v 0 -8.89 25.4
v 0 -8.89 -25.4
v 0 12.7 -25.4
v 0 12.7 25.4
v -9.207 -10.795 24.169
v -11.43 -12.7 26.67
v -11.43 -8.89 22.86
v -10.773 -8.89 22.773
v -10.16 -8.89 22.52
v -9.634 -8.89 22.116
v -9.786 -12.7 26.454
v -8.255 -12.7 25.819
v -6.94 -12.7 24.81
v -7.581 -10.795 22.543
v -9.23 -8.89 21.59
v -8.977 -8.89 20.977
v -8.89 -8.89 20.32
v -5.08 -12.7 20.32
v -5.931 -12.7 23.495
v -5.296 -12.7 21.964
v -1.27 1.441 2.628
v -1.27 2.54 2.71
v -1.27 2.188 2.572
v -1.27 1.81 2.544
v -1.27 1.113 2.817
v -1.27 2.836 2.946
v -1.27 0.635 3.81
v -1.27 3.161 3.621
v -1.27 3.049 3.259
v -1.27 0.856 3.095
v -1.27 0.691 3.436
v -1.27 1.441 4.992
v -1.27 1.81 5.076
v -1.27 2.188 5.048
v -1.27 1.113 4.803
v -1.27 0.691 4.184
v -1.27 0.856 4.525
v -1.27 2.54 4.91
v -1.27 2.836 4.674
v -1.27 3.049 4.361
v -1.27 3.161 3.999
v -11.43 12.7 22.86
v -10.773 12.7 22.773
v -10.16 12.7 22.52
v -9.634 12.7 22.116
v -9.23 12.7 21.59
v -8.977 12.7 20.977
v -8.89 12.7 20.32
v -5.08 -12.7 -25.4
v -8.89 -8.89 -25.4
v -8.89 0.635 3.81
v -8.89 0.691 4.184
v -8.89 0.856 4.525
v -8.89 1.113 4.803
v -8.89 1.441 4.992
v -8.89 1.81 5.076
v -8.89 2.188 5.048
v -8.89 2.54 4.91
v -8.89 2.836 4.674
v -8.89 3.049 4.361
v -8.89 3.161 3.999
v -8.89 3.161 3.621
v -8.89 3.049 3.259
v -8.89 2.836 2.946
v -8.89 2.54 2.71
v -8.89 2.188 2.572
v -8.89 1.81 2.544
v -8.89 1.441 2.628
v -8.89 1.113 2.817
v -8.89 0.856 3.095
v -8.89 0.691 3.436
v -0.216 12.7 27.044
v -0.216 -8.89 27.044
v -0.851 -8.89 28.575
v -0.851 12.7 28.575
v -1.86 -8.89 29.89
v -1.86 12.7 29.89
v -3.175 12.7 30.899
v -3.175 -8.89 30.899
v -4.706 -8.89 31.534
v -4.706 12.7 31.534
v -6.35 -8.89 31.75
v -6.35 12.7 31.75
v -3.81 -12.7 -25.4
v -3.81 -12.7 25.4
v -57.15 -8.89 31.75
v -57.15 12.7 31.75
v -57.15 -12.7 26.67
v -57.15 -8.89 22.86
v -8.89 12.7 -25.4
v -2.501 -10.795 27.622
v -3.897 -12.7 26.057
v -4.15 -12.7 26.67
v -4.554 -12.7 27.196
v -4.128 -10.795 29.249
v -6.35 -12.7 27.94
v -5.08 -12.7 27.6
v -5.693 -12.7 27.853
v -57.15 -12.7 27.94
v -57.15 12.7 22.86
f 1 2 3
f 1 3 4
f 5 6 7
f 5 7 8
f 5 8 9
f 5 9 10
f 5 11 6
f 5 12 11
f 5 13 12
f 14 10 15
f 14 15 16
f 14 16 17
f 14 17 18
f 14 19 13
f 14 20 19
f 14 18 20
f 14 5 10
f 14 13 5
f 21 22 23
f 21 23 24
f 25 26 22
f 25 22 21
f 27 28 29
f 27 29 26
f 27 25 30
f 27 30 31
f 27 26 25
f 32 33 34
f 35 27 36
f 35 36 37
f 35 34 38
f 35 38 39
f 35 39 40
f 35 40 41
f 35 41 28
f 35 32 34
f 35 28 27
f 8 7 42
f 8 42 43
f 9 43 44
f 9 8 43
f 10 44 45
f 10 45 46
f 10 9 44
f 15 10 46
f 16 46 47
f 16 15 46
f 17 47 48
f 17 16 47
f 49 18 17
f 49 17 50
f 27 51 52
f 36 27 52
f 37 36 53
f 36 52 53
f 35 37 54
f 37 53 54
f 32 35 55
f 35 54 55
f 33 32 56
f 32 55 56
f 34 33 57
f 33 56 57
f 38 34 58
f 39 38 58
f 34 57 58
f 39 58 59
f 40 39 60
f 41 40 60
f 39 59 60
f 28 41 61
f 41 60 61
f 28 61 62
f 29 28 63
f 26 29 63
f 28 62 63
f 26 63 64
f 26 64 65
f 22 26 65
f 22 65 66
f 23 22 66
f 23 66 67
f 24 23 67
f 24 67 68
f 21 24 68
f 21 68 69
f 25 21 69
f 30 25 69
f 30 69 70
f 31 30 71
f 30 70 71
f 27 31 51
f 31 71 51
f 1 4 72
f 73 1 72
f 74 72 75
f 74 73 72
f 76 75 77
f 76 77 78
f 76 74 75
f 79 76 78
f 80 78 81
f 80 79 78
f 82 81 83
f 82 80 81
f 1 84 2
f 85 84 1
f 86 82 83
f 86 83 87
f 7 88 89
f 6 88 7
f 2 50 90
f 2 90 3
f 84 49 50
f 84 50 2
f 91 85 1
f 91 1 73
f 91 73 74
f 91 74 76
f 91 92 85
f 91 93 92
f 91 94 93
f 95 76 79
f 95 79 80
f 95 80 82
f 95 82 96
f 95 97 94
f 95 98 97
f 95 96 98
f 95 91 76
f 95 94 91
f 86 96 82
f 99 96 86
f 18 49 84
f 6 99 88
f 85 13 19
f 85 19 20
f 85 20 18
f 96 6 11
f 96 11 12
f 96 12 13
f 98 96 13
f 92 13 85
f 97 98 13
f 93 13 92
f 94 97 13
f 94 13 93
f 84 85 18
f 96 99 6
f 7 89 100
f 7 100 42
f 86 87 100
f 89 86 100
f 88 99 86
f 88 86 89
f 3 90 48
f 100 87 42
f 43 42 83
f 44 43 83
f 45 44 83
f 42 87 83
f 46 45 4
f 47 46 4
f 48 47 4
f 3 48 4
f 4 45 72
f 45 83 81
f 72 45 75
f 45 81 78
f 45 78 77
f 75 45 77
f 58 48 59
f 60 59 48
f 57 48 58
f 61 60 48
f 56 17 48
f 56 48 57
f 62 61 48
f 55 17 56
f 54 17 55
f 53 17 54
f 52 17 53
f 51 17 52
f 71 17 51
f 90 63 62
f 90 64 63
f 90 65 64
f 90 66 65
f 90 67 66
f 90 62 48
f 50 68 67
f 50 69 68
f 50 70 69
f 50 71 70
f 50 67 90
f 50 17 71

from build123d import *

# Parameters (mm, degrees)
F1_DEPTH = 12.7
F2_SIZE  = 3.81
F3_R     = 1.27
F4_DEPTH = 7.62


with BuildPart() as f1:
    # F0 (on Front) → F1 (new body, symmetric)
    with BuildSketch(Plane.XZ):
        with BuildLine():
            Line((0, -25.4), (0, 25.4))
            ThreePointArc((0, 25.4), (-1.8598719395, 29.8901280605), (-6.35, 31.75))
            Line((-6.35, 31.75), (-57.15, 31.75))
            Line((-57.15, 31.75), (-57.15, 22.86))
            Line((-57.15, 22.86), (-11.43, 22.86))
            ThreePointArc((-11.43, 22.86), (-9.6339487758, 22.1160512242), (-8.89, 20.32))
            Line((-8.89, 20.32), (-8.89, -25.4))
            Line((-8.89, -25.4), (0, -25.4))
        make_face()
    extrude(amount=F1_DEPTH, both=True)

    # F2
    f2_edges = [f1.edges().sort_by_distance(p)[0] for p in [
        (-31.75, -12.7, 31.75),
        (-34.29, -12.7, 22.86),
    ]]
    chamfer(f2_edges, length=F2_SIZE)

    # F3 (on face) → F4 (cut)
    with BuildSketch(Plane(origin=(-8.89, 0, 0), x_dir=(0, -1, 0), z_dir=(-1, 0, 0))):
        with Locations((-1.905, 3.81)):
            Circle(F3_R)
    extrude(amount=-F4_DEPTH, mode=Mode.SUBTRACT)


solid = f1.part
